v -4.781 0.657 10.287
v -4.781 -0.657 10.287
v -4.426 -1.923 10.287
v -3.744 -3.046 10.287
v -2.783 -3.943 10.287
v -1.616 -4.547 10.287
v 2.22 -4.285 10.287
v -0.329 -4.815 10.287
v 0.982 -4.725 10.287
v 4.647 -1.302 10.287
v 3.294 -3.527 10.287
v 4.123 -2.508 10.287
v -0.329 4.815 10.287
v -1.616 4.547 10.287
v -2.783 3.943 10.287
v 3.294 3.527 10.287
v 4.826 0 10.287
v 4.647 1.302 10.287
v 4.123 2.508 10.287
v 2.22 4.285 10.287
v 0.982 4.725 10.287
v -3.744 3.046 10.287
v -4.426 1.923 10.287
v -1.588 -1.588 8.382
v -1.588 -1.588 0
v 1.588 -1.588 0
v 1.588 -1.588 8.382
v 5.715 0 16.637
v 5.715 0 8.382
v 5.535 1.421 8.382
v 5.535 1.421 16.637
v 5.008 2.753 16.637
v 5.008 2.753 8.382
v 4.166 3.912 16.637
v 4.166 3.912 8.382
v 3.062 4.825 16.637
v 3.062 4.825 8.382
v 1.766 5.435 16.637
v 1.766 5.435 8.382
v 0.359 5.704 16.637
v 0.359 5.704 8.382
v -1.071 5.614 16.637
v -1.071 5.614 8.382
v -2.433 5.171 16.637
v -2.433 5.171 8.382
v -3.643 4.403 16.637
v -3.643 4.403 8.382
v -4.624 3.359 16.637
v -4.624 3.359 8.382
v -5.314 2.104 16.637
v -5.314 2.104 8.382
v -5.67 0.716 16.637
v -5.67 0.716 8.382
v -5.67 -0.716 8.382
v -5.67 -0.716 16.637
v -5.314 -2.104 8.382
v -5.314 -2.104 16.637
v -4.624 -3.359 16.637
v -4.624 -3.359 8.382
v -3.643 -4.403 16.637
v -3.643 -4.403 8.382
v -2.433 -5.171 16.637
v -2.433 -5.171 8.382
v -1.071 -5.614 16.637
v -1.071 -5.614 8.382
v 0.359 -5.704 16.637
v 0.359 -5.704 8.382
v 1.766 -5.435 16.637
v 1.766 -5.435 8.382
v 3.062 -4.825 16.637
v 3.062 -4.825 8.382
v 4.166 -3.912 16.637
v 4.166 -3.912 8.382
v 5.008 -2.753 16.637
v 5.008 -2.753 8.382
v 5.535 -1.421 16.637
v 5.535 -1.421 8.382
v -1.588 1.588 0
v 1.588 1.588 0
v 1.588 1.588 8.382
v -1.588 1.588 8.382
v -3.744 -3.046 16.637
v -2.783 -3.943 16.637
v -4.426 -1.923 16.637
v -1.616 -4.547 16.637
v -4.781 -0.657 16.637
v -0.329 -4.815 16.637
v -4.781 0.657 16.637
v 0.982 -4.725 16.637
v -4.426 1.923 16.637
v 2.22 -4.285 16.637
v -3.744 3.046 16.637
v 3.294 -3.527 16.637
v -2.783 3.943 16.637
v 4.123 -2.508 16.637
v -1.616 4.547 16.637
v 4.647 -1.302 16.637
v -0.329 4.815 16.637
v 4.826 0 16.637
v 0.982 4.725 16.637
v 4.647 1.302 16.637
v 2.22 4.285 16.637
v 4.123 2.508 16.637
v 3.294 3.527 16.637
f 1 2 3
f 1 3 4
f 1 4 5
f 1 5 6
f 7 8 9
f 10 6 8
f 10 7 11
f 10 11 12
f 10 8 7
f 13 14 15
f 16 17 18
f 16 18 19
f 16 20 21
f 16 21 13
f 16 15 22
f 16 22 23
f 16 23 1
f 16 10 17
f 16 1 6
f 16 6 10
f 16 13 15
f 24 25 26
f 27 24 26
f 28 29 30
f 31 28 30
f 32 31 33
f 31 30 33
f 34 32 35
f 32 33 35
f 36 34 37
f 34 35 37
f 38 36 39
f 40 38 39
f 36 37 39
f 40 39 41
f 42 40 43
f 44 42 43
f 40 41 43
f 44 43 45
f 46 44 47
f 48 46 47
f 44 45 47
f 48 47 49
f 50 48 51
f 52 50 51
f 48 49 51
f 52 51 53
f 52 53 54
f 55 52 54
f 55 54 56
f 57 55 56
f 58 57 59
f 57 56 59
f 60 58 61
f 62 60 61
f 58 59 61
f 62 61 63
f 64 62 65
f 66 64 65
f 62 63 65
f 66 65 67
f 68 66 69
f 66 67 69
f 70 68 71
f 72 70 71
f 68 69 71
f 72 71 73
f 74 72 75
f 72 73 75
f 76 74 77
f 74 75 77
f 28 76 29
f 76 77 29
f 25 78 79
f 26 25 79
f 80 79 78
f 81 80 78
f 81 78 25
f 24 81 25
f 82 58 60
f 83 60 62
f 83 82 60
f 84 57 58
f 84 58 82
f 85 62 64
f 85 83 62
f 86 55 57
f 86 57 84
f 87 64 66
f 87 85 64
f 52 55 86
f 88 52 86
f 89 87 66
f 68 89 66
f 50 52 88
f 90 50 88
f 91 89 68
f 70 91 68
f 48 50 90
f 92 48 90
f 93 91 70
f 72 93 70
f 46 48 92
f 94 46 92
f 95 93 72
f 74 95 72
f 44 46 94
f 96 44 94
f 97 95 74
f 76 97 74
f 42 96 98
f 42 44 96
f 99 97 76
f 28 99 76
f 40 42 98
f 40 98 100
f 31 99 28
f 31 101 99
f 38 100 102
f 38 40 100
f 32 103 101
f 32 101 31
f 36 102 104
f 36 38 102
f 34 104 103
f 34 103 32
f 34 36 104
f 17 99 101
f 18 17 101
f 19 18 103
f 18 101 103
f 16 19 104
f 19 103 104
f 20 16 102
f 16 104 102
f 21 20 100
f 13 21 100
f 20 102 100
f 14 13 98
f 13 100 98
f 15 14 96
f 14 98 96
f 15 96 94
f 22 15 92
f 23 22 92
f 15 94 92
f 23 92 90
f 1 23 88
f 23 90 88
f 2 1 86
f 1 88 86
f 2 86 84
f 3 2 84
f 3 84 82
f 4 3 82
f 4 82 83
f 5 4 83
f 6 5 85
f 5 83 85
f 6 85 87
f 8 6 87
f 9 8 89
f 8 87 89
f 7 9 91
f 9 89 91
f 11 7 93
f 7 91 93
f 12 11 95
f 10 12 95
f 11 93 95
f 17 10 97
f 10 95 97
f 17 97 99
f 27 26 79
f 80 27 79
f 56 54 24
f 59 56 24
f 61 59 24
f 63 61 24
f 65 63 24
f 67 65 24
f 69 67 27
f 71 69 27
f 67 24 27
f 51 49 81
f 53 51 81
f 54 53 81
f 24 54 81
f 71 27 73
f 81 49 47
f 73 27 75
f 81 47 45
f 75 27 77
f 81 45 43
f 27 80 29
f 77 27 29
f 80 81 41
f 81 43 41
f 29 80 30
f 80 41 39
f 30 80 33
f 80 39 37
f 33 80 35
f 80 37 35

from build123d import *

# Parameters (mm, degrees)
F1_DEPTH = 8.382
F2_R     = 5.715
F3_DEPTH = 8.255
F4_R     = 4.826
F5_DEPTH = 6.35


with BuildPart() as f1:
    # F0 (on Top) → F1 (new body)
    with BuildSketch(Plane.XY):
        Polygon((1.5875, -1.5875), (1.5875, 0), (1.5875, 1.5875), (-1.5875, 1.5875), (-1.5875, -1.5875), align=None)
    extrude(amount=F1_DEPTH)

    # F2 (on face) → F3 (join)
    with BuildSketch(Plane.XY.offset(8.382)):
        Circle(F2_R)
    extrude(amount=F3_DEPTH)

    # F4 (on face) → F5 (cut)
    with BuildSketch(Plane.XY.offset(16.637)):
        Circle(F4_R)
    extrude(amount=-F5_DEPTH, mode=Mode.SUBTRACT)


solid = f1.part
